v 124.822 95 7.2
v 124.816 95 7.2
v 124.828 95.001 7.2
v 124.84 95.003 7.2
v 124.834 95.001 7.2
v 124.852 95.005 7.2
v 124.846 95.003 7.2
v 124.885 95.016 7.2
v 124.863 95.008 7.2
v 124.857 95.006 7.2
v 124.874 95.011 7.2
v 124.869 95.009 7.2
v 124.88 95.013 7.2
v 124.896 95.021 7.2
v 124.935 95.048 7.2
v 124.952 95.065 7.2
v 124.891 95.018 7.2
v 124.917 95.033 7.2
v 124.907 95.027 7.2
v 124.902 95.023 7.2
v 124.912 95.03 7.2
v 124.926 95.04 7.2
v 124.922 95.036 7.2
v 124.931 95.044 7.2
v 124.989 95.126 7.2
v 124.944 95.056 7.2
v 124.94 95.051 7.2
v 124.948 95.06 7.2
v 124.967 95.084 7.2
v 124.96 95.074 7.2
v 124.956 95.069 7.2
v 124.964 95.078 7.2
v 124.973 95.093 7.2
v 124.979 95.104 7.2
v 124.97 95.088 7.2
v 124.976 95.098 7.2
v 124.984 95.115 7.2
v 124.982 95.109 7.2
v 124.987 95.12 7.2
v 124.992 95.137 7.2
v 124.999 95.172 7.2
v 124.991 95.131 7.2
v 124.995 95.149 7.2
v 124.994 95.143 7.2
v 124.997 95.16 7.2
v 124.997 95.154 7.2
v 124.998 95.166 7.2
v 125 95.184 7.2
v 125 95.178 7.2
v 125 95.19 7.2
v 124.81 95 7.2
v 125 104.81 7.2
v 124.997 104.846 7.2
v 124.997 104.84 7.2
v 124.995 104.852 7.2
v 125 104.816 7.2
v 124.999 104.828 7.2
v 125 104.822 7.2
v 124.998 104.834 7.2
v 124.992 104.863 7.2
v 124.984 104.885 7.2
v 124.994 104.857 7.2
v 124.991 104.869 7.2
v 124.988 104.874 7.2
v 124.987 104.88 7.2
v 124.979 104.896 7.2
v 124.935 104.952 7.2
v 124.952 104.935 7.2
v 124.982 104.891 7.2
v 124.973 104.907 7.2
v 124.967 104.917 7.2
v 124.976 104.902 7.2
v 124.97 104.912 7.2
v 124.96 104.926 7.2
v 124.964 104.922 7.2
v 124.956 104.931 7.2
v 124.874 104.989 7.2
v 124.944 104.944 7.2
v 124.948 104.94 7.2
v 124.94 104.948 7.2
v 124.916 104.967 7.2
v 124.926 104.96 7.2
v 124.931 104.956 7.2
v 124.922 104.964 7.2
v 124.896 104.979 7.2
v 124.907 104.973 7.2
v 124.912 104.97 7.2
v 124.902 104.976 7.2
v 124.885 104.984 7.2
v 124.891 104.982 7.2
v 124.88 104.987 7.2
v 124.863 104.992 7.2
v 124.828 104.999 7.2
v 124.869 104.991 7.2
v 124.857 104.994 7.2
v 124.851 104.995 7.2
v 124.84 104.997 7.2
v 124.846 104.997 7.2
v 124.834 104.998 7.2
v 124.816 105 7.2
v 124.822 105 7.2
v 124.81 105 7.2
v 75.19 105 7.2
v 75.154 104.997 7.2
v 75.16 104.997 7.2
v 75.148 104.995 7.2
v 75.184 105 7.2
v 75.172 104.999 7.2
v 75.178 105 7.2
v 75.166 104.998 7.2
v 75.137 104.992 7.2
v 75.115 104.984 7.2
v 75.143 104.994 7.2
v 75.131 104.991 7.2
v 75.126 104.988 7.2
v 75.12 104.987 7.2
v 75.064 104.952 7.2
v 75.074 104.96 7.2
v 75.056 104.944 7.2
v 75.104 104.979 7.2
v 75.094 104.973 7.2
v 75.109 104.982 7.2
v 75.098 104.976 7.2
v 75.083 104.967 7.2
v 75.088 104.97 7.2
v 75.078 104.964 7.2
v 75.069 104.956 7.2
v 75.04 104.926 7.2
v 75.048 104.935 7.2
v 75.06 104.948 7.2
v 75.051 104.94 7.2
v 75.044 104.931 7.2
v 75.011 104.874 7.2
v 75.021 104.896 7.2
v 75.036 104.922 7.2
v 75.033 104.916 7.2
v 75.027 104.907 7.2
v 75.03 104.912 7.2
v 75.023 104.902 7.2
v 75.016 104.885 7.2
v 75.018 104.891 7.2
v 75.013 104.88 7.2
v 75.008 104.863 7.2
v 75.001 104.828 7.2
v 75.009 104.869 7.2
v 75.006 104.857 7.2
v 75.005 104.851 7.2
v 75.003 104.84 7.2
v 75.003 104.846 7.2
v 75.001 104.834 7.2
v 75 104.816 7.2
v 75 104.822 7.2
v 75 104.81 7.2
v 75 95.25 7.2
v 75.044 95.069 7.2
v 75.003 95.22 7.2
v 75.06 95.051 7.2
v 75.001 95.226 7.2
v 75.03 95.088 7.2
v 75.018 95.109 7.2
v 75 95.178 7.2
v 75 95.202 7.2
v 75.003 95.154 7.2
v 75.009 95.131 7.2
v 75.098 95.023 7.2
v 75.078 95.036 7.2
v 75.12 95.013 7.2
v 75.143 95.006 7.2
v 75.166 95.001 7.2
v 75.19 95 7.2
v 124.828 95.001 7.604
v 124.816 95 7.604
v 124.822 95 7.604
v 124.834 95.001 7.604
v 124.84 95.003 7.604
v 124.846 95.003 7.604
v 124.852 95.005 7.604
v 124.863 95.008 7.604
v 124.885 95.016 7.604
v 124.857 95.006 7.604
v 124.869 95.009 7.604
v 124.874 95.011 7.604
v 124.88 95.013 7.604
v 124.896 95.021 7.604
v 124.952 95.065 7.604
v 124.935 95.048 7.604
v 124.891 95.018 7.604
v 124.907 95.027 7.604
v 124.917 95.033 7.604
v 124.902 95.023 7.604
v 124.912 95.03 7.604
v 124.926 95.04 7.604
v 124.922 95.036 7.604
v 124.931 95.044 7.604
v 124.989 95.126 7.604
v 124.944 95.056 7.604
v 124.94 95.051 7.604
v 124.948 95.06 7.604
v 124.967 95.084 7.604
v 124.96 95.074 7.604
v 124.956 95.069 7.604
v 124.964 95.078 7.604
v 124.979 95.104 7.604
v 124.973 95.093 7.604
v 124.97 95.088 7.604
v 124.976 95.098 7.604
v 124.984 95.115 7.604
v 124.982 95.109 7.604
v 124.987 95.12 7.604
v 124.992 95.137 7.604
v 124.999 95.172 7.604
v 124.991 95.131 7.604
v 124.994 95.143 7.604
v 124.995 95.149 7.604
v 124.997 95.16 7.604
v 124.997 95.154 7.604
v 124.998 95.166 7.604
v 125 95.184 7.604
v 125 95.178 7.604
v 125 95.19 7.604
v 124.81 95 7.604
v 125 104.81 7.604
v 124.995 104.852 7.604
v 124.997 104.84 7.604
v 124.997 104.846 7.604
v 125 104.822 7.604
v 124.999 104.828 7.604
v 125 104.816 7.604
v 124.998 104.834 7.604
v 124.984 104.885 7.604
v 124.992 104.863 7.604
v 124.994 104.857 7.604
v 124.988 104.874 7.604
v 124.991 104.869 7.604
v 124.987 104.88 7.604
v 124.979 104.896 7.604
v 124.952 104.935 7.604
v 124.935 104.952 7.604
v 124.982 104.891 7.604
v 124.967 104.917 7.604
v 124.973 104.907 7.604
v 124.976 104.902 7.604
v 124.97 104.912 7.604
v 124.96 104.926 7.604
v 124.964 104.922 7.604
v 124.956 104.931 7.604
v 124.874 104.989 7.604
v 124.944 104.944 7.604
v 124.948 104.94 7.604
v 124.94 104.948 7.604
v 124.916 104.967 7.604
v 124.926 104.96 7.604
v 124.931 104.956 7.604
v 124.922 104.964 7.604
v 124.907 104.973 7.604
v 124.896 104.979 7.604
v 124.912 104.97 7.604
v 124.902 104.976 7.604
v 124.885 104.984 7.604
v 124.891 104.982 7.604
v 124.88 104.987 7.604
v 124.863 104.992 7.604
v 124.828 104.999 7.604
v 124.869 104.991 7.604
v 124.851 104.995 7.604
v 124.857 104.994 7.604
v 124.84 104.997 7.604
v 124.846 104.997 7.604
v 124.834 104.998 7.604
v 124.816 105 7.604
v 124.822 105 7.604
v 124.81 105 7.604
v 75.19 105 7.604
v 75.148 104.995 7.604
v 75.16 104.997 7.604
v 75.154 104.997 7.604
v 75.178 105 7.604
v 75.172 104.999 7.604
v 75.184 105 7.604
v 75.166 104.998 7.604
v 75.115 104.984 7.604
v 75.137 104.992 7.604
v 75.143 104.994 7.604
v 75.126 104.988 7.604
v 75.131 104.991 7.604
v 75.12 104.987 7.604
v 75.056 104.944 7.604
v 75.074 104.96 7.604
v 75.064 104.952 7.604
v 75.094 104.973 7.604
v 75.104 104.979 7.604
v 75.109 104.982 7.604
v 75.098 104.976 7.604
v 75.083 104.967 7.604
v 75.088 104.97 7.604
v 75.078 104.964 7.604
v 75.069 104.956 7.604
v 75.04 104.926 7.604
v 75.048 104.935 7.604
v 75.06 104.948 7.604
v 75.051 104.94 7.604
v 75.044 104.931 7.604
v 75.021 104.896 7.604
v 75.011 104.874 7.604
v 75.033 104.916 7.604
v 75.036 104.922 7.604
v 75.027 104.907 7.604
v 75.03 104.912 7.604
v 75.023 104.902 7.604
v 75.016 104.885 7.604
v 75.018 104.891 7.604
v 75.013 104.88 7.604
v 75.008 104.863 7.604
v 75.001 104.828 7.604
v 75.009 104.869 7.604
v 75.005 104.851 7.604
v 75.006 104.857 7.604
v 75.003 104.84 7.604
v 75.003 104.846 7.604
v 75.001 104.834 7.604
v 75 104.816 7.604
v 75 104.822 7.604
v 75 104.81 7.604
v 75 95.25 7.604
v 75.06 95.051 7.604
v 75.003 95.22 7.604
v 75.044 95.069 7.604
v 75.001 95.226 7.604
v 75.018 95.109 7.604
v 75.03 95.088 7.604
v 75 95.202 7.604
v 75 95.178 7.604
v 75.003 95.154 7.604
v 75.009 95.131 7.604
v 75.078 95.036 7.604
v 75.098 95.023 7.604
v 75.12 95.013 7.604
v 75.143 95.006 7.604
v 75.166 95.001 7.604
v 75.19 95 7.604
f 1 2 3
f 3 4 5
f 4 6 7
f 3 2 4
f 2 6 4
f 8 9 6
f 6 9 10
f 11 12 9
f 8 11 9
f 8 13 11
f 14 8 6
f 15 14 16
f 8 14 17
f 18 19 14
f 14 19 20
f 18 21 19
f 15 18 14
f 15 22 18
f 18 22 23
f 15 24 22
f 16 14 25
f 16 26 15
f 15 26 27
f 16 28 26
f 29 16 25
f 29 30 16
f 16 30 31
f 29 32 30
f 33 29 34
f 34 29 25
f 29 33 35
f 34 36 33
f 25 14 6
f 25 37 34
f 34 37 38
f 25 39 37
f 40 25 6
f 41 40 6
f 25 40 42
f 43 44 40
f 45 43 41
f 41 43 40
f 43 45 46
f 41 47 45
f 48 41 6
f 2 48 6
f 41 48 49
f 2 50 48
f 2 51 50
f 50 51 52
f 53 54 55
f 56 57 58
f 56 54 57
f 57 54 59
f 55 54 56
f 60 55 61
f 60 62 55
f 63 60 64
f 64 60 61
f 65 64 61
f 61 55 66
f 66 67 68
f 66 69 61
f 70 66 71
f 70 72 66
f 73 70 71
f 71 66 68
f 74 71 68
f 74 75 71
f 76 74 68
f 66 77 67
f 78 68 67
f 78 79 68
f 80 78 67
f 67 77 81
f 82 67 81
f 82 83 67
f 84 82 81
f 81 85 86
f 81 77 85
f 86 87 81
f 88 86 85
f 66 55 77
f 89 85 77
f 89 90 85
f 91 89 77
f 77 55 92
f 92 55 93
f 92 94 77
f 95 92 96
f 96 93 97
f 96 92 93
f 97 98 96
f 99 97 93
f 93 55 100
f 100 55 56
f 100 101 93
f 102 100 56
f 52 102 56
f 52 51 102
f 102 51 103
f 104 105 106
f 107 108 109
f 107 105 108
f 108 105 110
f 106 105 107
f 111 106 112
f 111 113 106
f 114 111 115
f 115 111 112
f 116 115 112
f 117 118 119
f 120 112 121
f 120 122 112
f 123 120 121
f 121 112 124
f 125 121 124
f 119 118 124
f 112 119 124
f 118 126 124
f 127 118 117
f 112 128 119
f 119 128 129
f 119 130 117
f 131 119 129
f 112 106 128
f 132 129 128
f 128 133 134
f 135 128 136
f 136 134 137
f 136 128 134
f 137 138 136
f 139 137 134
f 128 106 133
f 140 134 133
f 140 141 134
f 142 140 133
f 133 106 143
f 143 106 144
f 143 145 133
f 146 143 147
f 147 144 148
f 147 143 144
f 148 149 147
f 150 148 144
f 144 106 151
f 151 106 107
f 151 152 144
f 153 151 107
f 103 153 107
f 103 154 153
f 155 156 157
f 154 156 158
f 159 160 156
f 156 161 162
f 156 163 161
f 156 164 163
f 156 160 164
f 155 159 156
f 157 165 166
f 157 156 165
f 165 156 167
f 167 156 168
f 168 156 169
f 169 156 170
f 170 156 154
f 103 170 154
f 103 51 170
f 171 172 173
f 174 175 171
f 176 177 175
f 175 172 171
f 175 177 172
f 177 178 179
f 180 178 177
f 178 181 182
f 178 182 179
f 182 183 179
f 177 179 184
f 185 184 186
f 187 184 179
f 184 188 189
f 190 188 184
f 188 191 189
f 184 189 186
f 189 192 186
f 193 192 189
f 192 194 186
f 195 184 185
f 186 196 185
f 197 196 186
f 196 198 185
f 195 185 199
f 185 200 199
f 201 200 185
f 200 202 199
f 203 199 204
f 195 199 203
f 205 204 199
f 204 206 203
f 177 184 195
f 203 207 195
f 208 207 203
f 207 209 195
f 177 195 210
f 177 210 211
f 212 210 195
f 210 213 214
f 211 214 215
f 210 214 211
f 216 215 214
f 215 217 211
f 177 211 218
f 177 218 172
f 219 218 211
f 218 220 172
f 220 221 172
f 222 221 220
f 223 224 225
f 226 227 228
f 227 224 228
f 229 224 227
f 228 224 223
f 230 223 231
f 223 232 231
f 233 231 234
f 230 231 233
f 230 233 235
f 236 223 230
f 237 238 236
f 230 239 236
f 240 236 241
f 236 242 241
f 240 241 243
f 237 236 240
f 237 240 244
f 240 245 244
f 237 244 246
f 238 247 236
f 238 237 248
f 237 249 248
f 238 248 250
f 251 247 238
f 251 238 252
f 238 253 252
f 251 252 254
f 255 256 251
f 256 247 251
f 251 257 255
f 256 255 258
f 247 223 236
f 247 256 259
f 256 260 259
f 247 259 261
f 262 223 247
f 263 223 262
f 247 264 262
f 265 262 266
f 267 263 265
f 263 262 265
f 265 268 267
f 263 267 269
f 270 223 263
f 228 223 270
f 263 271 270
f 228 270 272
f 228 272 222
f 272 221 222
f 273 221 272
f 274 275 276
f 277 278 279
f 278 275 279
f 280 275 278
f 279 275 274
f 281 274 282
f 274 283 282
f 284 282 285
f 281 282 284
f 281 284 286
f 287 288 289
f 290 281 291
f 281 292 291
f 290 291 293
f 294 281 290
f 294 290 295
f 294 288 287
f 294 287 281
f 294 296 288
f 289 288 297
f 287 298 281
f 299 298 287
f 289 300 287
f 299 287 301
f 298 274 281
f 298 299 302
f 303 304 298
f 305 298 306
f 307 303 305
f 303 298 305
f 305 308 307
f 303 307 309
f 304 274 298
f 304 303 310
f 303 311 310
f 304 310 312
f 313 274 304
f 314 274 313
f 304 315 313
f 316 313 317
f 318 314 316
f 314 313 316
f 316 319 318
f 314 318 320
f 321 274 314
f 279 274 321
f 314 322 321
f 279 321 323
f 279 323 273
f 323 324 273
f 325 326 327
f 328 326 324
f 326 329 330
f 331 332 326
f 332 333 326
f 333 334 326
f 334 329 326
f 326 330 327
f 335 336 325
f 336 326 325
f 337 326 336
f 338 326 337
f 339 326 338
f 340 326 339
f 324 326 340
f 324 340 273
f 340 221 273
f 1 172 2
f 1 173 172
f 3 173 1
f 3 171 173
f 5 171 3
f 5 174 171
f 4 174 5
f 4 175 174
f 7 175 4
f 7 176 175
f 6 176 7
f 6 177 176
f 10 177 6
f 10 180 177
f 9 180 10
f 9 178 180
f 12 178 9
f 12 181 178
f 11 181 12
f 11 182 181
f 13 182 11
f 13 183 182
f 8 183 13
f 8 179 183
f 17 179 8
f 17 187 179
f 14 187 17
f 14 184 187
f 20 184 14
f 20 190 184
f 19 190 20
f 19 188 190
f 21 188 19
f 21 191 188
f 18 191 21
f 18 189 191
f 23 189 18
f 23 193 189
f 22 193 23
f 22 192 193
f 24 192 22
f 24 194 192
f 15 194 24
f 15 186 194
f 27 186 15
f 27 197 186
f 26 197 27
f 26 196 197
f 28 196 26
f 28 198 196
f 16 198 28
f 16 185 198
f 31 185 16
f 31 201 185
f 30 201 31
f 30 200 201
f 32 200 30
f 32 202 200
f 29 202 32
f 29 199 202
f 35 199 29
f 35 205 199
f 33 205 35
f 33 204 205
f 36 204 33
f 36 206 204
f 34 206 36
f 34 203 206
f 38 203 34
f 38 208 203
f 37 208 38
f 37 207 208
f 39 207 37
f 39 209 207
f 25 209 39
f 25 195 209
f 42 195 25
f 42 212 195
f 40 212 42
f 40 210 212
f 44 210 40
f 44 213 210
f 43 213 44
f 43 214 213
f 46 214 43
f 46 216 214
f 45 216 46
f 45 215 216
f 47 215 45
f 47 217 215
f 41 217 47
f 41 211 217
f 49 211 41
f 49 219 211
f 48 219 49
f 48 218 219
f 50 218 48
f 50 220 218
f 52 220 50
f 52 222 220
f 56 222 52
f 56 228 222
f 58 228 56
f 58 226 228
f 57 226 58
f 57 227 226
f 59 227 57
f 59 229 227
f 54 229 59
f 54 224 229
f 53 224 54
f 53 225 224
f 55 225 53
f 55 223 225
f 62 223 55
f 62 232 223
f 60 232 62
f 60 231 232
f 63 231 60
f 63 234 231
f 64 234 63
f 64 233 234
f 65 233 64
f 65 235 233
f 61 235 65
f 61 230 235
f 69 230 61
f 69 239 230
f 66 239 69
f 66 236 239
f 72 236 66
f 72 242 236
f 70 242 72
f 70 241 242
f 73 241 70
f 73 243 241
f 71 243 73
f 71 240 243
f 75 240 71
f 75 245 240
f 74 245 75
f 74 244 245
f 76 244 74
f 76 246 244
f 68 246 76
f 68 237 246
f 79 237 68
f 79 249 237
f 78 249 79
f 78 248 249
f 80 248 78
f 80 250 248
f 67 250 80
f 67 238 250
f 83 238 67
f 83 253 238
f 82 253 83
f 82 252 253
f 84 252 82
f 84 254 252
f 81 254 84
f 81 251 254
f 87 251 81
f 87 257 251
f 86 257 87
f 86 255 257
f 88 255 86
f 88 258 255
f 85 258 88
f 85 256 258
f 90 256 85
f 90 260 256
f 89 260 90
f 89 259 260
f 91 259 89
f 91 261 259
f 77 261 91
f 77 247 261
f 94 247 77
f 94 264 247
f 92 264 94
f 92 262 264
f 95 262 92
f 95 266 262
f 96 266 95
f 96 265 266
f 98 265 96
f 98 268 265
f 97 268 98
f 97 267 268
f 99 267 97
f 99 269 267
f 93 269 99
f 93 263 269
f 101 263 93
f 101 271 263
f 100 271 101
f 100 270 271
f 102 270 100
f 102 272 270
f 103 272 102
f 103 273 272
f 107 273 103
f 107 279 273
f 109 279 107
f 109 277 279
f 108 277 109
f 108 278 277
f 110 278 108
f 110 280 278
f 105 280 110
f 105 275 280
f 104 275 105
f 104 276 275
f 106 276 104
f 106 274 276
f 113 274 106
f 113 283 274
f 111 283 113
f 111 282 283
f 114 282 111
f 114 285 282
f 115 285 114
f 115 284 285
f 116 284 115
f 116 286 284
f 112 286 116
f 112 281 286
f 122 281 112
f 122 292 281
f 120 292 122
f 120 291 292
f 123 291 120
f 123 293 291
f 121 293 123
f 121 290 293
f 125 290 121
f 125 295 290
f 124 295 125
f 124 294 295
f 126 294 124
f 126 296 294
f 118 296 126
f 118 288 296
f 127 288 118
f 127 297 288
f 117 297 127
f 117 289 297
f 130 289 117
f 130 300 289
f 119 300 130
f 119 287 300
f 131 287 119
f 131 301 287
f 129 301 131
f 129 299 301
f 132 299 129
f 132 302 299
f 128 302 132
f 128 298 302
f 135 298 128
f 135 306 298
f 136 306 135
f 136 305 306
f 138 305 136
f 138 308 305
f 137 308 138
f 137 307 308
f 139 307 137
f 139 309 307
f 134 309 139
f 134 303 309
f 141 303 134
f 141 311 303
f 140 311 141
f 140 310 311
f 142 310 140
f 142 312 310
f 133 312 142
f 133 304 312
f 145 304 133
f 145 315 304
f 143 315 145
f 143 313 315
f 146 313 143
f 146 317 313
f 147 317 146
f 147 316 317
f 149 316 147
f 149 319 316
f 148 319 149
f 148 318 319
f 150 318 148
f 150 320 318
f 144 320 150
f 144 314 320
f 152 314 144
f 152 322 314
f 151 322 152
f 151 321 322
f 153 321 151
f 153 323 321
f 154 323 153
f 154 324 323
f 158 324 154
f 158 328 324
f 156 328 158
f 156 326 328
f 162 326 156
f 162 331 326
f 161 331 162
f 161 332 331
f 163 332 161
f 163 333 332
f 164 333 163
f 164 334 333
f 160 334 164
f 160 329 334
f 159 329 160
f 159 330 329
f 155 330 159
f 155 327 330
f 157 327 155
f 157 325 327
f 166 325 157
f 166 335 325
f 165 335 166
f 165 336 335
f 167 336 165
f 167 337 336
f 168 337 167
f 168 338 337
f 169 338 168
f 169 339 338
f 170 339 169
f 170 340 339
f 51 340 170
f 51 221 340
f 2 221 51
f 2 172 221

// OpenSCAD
module drawBasicShape(x1, y1, x2, y2, width)
{
	length = sqrt((x1-x2)*(x1-x2) + (y1-y2)*(y1-y2));
	if (width!=0.0) {
		square(size = [width, length], center = false);
		translate([width/2.0, 0, 0]) circle(d=width);
		translate([width/2.0, length, 0]) circle(d=width);
	}
}

module translateAndRotate(x1, y1, x2, y2, width)
{
	if (width != 0.0) {
		angle = atan((y2-y1)/(x2-x1)) +270;
		if (x2>=x1) {
			translate([x1, y1, 0.0]) rotate([0.0, 0.0, angle]) translate([-width/2.0, 0.0, 0.0]) scale([1.0, 1.0, 1.0]) drawBasicShape(x1, y1, x2, y2, width);
		}
		else {
			translate([x1, y1, 0.0]) rotate([0.0, 0.0, angle+180]) translate([-width/2.0, 0.0, 0.0]) scale([1.0, 1.0, 1.0]) drawBasicShape(x1, y1, x2, y2, width);		}
	}
}

$fn=50;

points17 = [
[75.77800000, 95.77800000, 0.00000000],
[124.22200000, 95.77800000, 0.37999672],
[124.22200000, 104.22200000, 0.37997788],
[75.77800000, 104.22200000, 0.37999548],
[75.77800000, 95.83800000, 0.37998140],
[75.48400000, 95.48400000, 0.00000000],
[124.51600000, 95.48400000, 0.37999746],
[124.51600000, 104.51600000, 0.37998977],
[75.48400000, 104.51600000, 0.37999868],
[75.48400000, 95.54400000, 0.37998644],
[75.19000000, 95.19000000, 0.00000000],
[124.81000000, 95.19000000, 0.38000060],
[124.81000000, 104.81000000, 0.38000021],
[75.19000000, 104.81000000, 0.37999939],
[75.19000000, 95.25000000, 0.38000344],
[75.53600000, 95.39000000, 0.00000000],
[76.11100000, 95.94600000, 0.00000000],
[75.94600000, 96.11100000, 0.37935605],
[75.94600000, 96.52800000, 0.38015610],
[76.52800000, 95.94600000, 0.37989934],
[76.94500000, 95.94600000, 0.38001190],
[75.94600000, 96.94500000, 0.37994651],
[75.94600000, 97.36200000, 0.38015610],
[77.36200000, 95.94600000, 0.37996589],
[77.77900000, 95.94600000, 0.38015610],
[75.94600000, 97.77900000, 0.37999966],
[75.94600000, 98.19600000, 0.38001190],
[78.19600000, 95.94600000, 0.38000201],
[78.61300000, 95.94600000, 0.38015610],
[75.94600000, 98.61300000, 0.38000362],
[75.94600000, 99.03000000, 0.38015610],
[79.03000000, 95.94600000, 0.38001859],
[79.44700000, 95.94600000, 0.38001190],
[75.94600000, 99.44700000, 0.38001785],
[75.94600000, 99.86400000, 0.38015610],
[79.86400000, 95.94600000, 0.38001726],
[80.28100000, 95.94600000, 0.38001190],
[75.94600000, 100.28100000, 0.38003640],
[75.94600000, 100.69800000, 0.38001190],
[80.69800000, 95.94600000, 0.38002534],
[81.11500000, 95.94600000, 0.38001190],
[75.94600000, 101.11500000, 0.38003252],
[75.94600000, 101.53300000, 0.37930814],
[81.53300000, 95.94600000, 0.37997836],
[81.95000000, 95.94600000, 0.38015610],
[75.94600000, 101.95000000, 0.37998072],
[75.94600000, 102.36700000, 0.38001190],
[82.36700000, 95.94600000, 0.37998939],
[82.78400000, 95.94600000, 0.38001190],
[75.94600000, 102.78400000, 0.37999079],
[75.94600000, 103.20100000, 0.38001190],
[83.20100000, 95.94600000, 0.37999789],
[83.61800000, 95.94600000, 0.38001190],
[75.94600000, 103.61800000, 0.37999314],
[75.95600000, 104.02400000, 0.38048727],
[84.03500000, 95.94600000, 0.38000275],
[84.45200000, 95.94600000, 0.38001190],
[76.34400000, 104.05400000, 0.38000754],
[76.76100000, 104.05400000, 0.38001190],
[84.86900000, 95.94600000, 0.38000229],
[85.28600000, 95.94600000, 0.38015610],
[77.17800000, 104.05400000, 0.38000229],
[77.59500000, 104.05400000, 0.38001190],
[85.70300000, 95.94600000, 0.38000229],
[86.12000000, 95.94600000, 0.38015610],
[78.01200000, 104.05400000, 0.38000229],
[78.42900000, 104.05400000, 0.38001190],
[86.53700000, 95.94600000, 0.38000754],
[86.95400000, 95.94600000, 0.38001190],
[78.84600000, 104.05400000, 0.38000229],
[79.26300000, 104.05400000, 0.38001190],
[87.37100000, 95.94600000, 0.38000754],
[87.78900000, 95.94600000, 0.37930814],
[79.68000000, 104.05400000, 0.37998415],
[80.09700000, 104.05400000, 0.38015610],
[88.20600000, 95.94600000, 0.37998415],
[88.62300000, 95.94600000, 0.38001190],
[80.51500000, 104.05400000, 0.38000754],
[80.93200000, 104.05400000, 0.38001190],
[89.04000000, 95.94600000, 0.38000229],
[89.45700000, 95.94600000, 0.38001190],
[81.34900000, 104.05400000, 0.38000754],
[81.76600000, 104.05400000, 0.38001190],
[89.87400000, 95.94600000, 0.38000229],
[90.29100000, 95.94600000, 0.38015610],
[82.18300000, 104.05400000, 0.38000229],
[82.60000000, 104.05400000, 0.38001190],
[90.70800000, 95.94600000, 0.38000754],
[91.12500000, 95.94600000, 0.38001190],
[83.01700000, 104.05400000, 0.38000229],
[83.43400000, 104.05400000, 0.38001190],
[91.54200000, 95.94600000, 0.38000754],
[91.95900000, 95.94600000, 0.38001190],
[83.85100000, 104.05400000, 0.38000229],
[84.26800000, 104.05400000, 0.38015610],
[92.37600000, 95.94600000, 0.38000229],
[92.79300000, 95.94600000, 0.38001190],
[84.68500000, 104.05400000, 0.38000754],
[85.10200000, 104.05400000, 0.38001190],
[93.21000000, 95.94600000, 0.38000229],
[93.62700000, 95.94600000, 0.38001190],
[85.51900000, 104.05400000, 0.38000754],
[85.93600000, 104.05400000, 0.38001190],
[94.04400000, 95.94600000, 0.38000229],
[94.46200000, 95.94600000, 0.37945200],
[86.35300000, 104.05400000, 0.37998415],
[86.77000000, 104.05400000, 0.38001190],
[94.87900000, 95.94600000, 0.37998940],
[95.29600000, 95.94600000, 0.38001190],
[87.18800000, 104.05400000, 0.38000229],
[87.60500000, 104.05400000, 0.38001190],
[95.71300000, 95.94600000, 0.38000754],
[96.13000000, 95.94600000, 0.38001190],
[88.02200000, 104.05400000, 0.38000229],
[88.43900000, 104.05400000, 0.38015610],
[96.54700000, 95.94600000, 0.38000229],
[96.96400000, 95.94600000, 0.38001190],
[88.85600000, 104.05400000, 0.38000754],
[89.27300000, 104.05400000, 0.38001190],
[97.38100000, 95.94600000, 0.38000229],
[97.79800000, 95.94600000, 0.38001190],
[89.69000000, 104.05400000, 0.38000754],
[90.10700000, 104.05400000, 0.38001190],
[98.21500000, 95.94600000, 0.38000229],
[98.63200000, 95.94600000, 0.38015610],
[90.52400000, 104.05400000, 0.38000229],
[90.94100000, 104.05400000, 0.38001190],
[99.04900000, 95.94600000, 0.38000229],
[99.46600000, 95.94600000, 0.38015610],
[91.35800000, 104.05400000, 0.38000229],
[91.77500000, 104.05400000, 0.38001190],
[99.88300000, 95.94600000, 0.38000754],
[100.30000000, 95.94600000, 0.38001190],
[92.19200000, 104.05400000, 0.38000229],
[92.60900000, 104.05400000, 0.38015610],
[100.71800000, 95.94600000, 0.37998415],
[101.13500000, 95.94600000, 0.38001190],
[93.02600000, 104.05400000, 0.37998940],
[93.44400000, 104.05400000, 0.37930814],
[101.55200000, 95.94600000, 0.38000229],
[101.96900000, 95.94600000, 0.38001190],
[93.86100000, 104.05400000, 0.38000754],
[94.27800000, 104.05400000, 0.38001190],
[102.38600000, 95.94600000, 0.38000229],
[102.80300000, 95.94600000, 0.38015610],
[94.69500000, 104.05400000, 0.38000229],
[95.11200000, 104.05400000, 0.38001190],
[103.22000000, 95.94600000, 0.38000754],
[103.63700000, 95.94600000, 0.38001190],
[95.52900000, 104.05400000, 0.38000229],
[95.94600000, 104.05400000, 0.38001190],
[104.05400000, 95.94600000, 0.38000754],
[104.47100000, 95.94600000, 0.38001190],
[96.36300000, 104.05400000, 0.38000229],
[96.78000000, 104.05400000, 0.38015610],
[104.88800000, 95.94600000, 0.38000229],
[105.30500000, 95.94600000, 0.38001190],
[97.19700000, 104.05400000, 0.38000754],
[97.61400000, 104.05400000, 0.38001190],
[105.72200000, 95.94600000, 0.38000229],
[106.13900000, 95.94600000, 0.38001190],
[98.03100000, 104.05400000, 0.38000754],
[98.44800000, 104.05400000, 0.38001190],
[106.55600000, 95.94600000, 0.38000229],
[106.97300000, 95.94600000, 0.38015610],
[98.86500000, 104.05400000, 0.38000229],
[99.28200000, 104.05400000, 0.38001190],
[107.39100000, 95.94600000, 0.37998940],
[107.80800000, 95.94600000, 0.38001190],
[99.69900000, 104.05400000, 0.37998415],
[100.11700000, 104.05400000, 0.37930814],
[108.22500000, 95.94600000, 0.38000754],
[108.64200000, 95.94600000, 0.38001190],
[100.53400000, 104.05400000, 0.38000229],
[100.95100000, 104.05400000, 0.38015610],
[109.05900000, 95.94600000, 0.38000229],
[109.47600000, 95.94600000, 0.38001190],
[101.36800000, 104.05400000, 0.38000754],
[101.78500000, 104.05400000, 0.38001190],
[109.89300000, 95.94600000, 0.38000229],
[110.31000000, 95.94600000, 0.38001190],
[102.20200000, 104.05400000, 0.38000754],
[102.61900000, 104.05400000, 0.38001190],
[110.72700000, 95.94600000, 0.38000229],
[111.14400000, 95.94600000, 0.38015610],
[103.03600000, 104.05400000, 0.38000229],
[103.45300000, 104.05400000, 0.38001190],
[111.56100000, 95.94600000, 0.38000754],
[111.97800000, 95.94600000, 0.38001190],
[103.87000000, 104.05400000, 0.38000229],
[104.28700000, 104.05400000, 0.38001190],
[112.39500000, 95.94600000, 0.38000754],
[112.81200000, 95.94600000, 0.38001190],
[104.70400000, 104.05400000, 0.38000229],
[105.12100000, 104.05400000, 0.38015610],
[113.22900000, 95.94600000, 0.38000229],
[113.64700000, 95.94600000, 0.37930814],
[105.53800000, 104.05400000, 0.37998415],
[105.95500000, 104.05400000, 0.38015610],
[114.06400000, 95.94600000, 0.37998415],
[114.48100000, 95.94600000, 0.38001190],
[106.37300000, 104.05400000, 0.38000754],
[106.79000000, 104.05400000, 0.38001190],
[114.89800000, 95.94600000, 0.38000229],
[115.31500000, 95.94600000, 0.38015610],
[107.20700000, 104.05400000, 0.38000229],
[107.62400000, 104.05400000, 0.38001190],
[115.73200000, 95.94600000, 0.38000229],
[116.14900000, 95.94600000, 0.38015610],
[108.04100000, 104.05400000, 0.38000229],
[108.45800000, 104.05400000, 0.38001190],
[116.56600000, 95.94600000, 0.38000754],
[116.98300000, 95.94600000, 0.38001190],
[108.87500000, 104.05400000, 0.38000229],
[109.29200000, 104.05400000, 0.38015610],
[117.40000000, 95.94600000, 0.38000229],
[117.81700000, 95.94600000, 0.38001190],
[109.70900000, 104.05400000, 0.38000229],
[110.12600000, 104.05400000, 0.38015610],
[118.23400000, 95.94600000, 0.38000229],
[118.65100000, 95.94600000, 0.38001190],
[110.54300000, 104.05400000, 0.38000754],
[110.96000000, 104.05400000, 0.38001190],
[119.06800000, 95.94600000, 0.38000229],
[119.48500000, 95.94600000, 0.38001190],
[111.37700000, 104.05400000, 0.38000754],
[111.79400000, 104.05400000, 0.38001190],
[119.90200000, 95.94600000, 0.38000229],
[120.32000000, 95.94600000, 0.37945200],
[112.21100000, 104.05400000, 0.37998415],
[112.62900000, 104.05400000, 0.37930814],
[120.73700000, 95.94600000, 0.38000754],
[121.15400000, 95.94600000, 0.38001190],
[113.04600000, 104.05400000, 0.38000229],
[113.46300000, 104.05400000, 0.38001190],
[121.57100000, 95.94600000, 0.38000754],
[121.98800000, 95.94600000, 0.38001190],
[113.88000000, 104.05400000, 0.38000229],
[114.29700000, 104.05400000, 0.38015610],
[122.40500000, 95.94600000, 0.38000229],
[122.82200000, 95.94600000, 0.38001190],
[114.71400000, 104.05400000, 0.38000754],
[115.13100000, 104.05400000, 0.38001190],
[123.23900000, 95.94600000, 0.38000229],
[123.65600000, 95.94600000, 0.38001190],
[115.54800000, 104.05400000, 0.38000754],
[115.96500000, 104.05400000, 0.38001190],
[124.04400000, 95.97500000, 0.37998455],
[124.05400000, 96.38200000, 0.37976376],
[116.38200000, 104.05400000, 0.37999868],
[116.79900000, 104.05400000, 0.38001190],
[124.05400000, 96.79900000, 0.37999789],
[124.05400000, 97.21600000, 0.38001190],
[117.21600000, 104.05400000, 0.37999079],
[117.63300000, 104.05400000, 0.38015610],
[124.05400000, 97.63300000, 0.37998939],
[124.05400000, 98.05000000, 0.38001190],
[118.05000000, 104.05400000, 0.37998780],
[118.46700000, 104.05400000, 0.38001190],
[124.05400000, 98.46700000, 0.37997836],
[124.05400000, 98.88400000, 0.38001190],
[118.88400000, 104.05400000, 0.37997562],
[119.30200000, 104.05400000, 0.37945200],
[124.05400000, 99.30200000, 0.38002534],
[124.05400000, 99.71900000, 0.38015610],
[119.71900000, 104.05400000, 0.38002660],
[120.13600000, 104.05400000, 0.38001190],
[124.05400000, 100.13600000, 0.38002811],
[124.05400000, 100.55300000, 0.38001190],
[120.55300000, 104.05400000, 0.38002999],
[120.97000000, 104.05400000, 0.38001190],
[124.05400000, 100.97000000, 0.38003238],
[124.05400000, 101.38700000, 0.38001190],
[121.38700000, 104.05400000, 0.38001957],
[121.80400000, 104.05400000, 0.38001190],
[124.05400000, 101.80400000, 0.38002091],
[124.05400000, 102.22100000, 0.38001190],
[122.22100000, 104.05400000, 0.38002285],
[122.63800000, 104.05400000, 0.38001190],
[124.05400000, 102.63800000, 0.37999592],
[124.05400000, 103.05500000, 0.38001190],
[123.05500000, 104.05400000, 0.37998907],
[123.47200000, 104.05400000, 0.38001190],
[124.05400000, 103.47200000, 0.37997240],
[124.05400000, 103.88900000, 0.38001190],
[123.88900000, 104.05400000, 0.37961375],
];

translate([0.0, 0.0, 7.20000000]) {
	linear_extrude(height = 0.40400000, center = false, convexity = 10, twist = 0) {
		union() {
			for( i=[0:len(points17)-2] ){ 
				x1 = points17[i][0];
				y1 = points17[i][1];
				x2 = points17[i+1][0];
				y2 = points17[i+1][1];
				width = points17[i+1][2];
				translateAndRotate(x1, y1, x2, y2, width);
			}
		}
	}
}
